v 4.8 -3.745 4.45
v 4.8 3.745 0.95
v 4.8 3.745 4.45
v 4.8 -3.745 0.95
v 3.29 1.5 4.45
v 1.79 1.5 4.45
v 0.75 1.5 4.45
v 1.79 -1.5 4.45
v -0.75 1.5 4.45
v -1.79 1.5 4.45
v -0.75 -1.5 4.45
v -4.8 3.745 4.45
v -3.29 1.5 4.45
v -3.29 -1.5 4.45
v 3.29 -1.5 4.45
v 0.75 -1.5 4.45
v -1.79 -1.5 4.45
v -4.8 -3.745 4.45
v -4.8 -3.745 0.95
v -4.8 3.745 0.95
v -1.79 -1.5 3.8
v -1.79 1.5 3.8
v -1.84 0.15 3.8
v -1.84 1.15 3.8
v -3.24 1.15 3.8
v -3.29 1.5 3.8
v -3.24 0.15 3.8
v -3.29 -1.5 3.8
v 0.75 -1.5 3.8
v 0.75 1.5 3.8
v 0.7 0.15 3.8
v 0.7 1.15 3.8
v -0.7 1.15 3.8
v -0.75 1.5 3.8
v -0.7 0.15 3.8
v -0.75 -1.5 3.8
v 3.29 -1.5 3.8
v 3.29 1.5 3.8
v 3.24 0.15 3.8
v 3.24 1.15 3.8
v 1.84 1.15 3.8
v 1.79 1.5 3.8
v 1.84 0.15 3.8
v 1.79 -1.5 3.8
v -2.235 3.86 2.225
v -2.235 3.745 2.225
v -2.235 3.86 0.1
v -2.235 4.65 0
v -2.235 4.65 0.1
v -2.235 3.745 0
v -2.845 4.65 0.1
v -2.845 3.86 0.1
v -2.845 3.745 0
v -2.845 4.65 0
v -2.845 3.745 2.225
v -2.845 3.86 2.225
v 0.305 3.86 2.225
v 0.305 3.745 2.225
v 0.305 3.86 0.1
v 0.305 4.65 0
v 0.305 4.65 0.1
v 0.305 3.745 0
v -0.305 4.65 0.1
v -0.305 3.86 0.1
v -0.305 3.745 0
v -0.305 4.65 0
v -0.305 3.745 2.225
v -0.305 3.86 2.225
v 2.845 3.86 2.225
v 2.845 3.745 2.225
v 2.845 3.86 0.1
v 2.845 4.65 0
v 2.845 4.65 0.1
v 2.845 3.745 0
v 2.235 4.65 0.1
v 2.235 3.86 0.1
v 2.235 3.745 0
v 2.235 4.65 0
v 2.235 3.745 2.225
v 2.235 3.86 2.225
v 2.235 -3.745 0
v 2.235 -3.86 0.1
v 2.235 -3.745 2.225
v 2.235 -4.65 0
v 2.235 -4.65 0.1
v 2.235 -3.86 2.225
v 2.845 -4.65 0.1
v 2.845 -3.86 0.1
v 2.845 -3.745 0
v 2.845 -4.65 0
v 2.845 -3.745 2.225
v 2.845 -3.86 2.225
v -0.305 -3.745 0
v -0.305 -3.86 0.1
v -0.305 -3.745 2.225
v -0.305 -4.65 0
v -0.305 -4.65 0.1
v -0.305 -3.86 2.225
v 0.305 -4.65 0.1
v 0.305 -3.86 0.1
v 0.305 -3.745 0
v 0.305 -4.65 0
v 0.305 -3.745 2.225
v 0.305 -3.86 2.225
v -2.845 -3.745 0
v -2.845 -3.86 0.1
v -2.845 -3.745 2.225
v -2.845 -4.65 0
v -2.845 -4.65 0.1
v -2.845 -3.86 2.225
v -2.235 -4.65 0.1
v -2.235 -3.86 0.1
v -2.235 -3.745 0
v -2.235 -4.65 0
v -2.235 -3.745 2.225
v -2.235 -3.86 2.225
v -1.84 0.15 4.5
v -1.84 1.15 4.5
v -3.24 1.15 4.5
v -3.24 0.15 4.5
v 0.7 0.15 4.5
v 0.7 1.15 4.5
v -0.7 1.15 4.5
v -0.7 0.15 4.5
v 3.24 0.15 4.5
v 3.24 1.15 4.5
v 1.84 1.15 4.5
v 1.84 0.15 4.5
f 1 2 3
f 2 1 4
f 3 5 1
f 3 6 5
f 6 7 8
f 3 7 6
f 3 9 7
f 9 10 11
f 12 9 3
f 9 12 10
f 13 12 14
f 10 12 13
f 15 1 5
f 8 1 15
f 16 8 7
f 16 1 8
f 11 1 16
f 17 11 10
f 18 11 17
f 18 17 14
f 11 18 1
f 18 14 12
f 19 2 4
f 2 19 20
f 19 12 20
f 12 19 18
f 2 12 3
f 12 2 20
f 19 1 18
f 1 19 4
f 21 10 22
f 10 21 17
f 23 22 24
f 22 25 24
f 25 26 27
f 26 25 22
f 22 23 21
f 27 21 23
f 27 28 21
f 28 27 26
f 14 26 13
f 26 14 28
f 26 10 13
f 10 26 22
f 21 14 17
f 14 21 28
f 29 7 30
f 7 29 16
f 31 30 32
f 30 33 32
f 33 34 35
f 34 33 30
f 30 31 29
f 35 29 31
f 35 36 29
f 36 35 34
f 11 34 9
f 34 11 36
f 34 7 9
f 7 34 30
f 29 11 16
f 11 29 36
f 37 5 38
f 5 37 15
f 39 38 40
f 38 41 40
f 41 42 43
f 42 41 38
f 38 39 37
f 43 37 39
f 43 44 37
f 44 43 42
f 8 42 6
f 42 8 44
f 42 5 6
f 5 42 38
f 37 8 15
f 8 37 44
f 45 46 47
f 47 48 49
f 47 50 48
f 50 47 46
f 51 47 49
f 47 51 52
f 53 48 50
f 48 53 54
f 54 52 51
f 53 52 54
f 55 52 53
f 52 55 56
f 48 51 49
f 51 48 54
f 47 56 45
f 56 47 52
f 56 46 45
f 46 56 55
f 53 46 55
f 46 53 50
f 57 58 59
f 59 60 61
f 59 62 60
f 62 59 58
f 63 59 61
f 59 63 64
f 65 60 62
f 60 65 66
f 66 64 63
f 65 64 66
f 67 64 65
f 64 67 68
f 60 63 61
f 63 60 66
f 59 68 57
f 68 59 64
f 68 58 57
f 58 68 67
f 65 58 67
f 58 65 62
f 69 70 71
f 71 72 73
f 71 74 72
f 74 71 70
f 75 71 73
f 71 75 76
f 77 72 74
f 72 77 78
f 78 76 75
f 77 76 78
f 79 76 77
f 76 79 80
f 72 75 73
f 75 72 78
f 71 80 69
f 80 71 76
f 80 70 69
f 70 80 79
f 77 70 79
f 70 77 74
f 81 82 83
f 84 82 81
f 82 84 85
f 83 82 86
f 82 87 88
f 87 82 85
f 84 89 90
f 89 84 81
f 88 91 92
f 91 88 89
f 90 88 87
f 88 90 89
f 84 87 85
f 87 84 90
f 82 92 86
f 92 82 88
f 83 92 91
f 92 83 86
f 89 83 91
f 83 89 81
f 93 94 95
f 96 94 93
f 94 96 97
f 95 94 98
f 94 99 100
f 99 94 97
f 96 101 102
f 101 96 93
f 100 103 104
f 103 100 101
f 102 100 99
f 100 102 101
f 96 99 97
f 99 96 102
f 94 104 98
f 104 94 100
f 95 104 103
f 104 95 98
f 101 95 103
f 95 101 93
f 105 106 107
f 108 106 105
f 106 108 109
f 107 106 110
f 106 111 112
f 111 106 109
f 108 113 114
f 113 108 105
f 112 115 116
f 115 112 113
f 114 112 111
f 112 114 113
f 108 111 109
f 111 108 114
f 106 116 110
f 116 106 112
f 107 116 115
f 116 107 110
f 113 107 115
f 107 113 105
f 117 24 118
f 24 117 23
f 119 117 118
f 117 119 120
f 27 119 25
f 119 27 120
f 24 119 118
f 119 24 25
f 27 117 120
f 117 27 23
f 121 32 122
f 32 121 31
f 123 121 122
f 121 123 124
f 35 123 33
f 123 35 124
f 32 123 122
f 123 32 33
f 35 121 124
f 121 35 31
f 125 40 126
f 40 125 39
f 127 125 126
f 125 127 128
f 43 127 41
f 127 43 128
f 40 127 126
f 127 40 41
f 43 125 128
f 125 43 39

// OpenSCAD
/*
 * Create a CK Components 3-switch surface mount DIP switch package.
 *
 * Author: Ian McInerney
 * Created: June 22, 2013
 */

// An individual pin
module pin() {
	translate([0.0,0.79/2+0.115,0.05])cube(size=[0.61,0.79,0.1], center=true);
	translate([0.0,0.115/2,1.1125])cube(size=[0.61,0.115,2.225], center=true);
}



// Main module body
difference() {
	// The main body
	translate([0.0,0.0,2.7])cube(size=[9.6,7.49,3.5], center=true);

	// The switch cutouts
	translate([-2.54,0.0,4.3])cube(size=[1.5,3,1.0], center=true);
	translate([0.0,0.0,4.3])cube(size=[1.5,3,1.0], center=true);
	translate([2.54,0.0,4.3])cube(size=[1.5,3,1.0], center=true);
}

// Create the switches in the cutouts
translate([-2.54,1.3/2,4.0])cube(size=[1.4,1,1], center=true);
translate([0.0,1.3/2,4.0])cube(size=[1.4,1,1], center=true);
translate([2.54,1.3/2,4.0])cube(size=[1.4,1,1], center=true);

// Create the individual pins
translate([-2.54,7.49/2,0.0])pin();
translate([0.0,7.49/2,0.0])pin();
translate([2.54,7.49/2,0.0])pin();
rotate([0.0,0.0,180])translate([-2.54,7.49/2,0.0])pin();
rotate([0.0,0.0,180])translate([0.0,7.49/2,0.0])pin();
rotate([0.0,0.0,180])translate([2.54,7.49/2,0.0])pin();
